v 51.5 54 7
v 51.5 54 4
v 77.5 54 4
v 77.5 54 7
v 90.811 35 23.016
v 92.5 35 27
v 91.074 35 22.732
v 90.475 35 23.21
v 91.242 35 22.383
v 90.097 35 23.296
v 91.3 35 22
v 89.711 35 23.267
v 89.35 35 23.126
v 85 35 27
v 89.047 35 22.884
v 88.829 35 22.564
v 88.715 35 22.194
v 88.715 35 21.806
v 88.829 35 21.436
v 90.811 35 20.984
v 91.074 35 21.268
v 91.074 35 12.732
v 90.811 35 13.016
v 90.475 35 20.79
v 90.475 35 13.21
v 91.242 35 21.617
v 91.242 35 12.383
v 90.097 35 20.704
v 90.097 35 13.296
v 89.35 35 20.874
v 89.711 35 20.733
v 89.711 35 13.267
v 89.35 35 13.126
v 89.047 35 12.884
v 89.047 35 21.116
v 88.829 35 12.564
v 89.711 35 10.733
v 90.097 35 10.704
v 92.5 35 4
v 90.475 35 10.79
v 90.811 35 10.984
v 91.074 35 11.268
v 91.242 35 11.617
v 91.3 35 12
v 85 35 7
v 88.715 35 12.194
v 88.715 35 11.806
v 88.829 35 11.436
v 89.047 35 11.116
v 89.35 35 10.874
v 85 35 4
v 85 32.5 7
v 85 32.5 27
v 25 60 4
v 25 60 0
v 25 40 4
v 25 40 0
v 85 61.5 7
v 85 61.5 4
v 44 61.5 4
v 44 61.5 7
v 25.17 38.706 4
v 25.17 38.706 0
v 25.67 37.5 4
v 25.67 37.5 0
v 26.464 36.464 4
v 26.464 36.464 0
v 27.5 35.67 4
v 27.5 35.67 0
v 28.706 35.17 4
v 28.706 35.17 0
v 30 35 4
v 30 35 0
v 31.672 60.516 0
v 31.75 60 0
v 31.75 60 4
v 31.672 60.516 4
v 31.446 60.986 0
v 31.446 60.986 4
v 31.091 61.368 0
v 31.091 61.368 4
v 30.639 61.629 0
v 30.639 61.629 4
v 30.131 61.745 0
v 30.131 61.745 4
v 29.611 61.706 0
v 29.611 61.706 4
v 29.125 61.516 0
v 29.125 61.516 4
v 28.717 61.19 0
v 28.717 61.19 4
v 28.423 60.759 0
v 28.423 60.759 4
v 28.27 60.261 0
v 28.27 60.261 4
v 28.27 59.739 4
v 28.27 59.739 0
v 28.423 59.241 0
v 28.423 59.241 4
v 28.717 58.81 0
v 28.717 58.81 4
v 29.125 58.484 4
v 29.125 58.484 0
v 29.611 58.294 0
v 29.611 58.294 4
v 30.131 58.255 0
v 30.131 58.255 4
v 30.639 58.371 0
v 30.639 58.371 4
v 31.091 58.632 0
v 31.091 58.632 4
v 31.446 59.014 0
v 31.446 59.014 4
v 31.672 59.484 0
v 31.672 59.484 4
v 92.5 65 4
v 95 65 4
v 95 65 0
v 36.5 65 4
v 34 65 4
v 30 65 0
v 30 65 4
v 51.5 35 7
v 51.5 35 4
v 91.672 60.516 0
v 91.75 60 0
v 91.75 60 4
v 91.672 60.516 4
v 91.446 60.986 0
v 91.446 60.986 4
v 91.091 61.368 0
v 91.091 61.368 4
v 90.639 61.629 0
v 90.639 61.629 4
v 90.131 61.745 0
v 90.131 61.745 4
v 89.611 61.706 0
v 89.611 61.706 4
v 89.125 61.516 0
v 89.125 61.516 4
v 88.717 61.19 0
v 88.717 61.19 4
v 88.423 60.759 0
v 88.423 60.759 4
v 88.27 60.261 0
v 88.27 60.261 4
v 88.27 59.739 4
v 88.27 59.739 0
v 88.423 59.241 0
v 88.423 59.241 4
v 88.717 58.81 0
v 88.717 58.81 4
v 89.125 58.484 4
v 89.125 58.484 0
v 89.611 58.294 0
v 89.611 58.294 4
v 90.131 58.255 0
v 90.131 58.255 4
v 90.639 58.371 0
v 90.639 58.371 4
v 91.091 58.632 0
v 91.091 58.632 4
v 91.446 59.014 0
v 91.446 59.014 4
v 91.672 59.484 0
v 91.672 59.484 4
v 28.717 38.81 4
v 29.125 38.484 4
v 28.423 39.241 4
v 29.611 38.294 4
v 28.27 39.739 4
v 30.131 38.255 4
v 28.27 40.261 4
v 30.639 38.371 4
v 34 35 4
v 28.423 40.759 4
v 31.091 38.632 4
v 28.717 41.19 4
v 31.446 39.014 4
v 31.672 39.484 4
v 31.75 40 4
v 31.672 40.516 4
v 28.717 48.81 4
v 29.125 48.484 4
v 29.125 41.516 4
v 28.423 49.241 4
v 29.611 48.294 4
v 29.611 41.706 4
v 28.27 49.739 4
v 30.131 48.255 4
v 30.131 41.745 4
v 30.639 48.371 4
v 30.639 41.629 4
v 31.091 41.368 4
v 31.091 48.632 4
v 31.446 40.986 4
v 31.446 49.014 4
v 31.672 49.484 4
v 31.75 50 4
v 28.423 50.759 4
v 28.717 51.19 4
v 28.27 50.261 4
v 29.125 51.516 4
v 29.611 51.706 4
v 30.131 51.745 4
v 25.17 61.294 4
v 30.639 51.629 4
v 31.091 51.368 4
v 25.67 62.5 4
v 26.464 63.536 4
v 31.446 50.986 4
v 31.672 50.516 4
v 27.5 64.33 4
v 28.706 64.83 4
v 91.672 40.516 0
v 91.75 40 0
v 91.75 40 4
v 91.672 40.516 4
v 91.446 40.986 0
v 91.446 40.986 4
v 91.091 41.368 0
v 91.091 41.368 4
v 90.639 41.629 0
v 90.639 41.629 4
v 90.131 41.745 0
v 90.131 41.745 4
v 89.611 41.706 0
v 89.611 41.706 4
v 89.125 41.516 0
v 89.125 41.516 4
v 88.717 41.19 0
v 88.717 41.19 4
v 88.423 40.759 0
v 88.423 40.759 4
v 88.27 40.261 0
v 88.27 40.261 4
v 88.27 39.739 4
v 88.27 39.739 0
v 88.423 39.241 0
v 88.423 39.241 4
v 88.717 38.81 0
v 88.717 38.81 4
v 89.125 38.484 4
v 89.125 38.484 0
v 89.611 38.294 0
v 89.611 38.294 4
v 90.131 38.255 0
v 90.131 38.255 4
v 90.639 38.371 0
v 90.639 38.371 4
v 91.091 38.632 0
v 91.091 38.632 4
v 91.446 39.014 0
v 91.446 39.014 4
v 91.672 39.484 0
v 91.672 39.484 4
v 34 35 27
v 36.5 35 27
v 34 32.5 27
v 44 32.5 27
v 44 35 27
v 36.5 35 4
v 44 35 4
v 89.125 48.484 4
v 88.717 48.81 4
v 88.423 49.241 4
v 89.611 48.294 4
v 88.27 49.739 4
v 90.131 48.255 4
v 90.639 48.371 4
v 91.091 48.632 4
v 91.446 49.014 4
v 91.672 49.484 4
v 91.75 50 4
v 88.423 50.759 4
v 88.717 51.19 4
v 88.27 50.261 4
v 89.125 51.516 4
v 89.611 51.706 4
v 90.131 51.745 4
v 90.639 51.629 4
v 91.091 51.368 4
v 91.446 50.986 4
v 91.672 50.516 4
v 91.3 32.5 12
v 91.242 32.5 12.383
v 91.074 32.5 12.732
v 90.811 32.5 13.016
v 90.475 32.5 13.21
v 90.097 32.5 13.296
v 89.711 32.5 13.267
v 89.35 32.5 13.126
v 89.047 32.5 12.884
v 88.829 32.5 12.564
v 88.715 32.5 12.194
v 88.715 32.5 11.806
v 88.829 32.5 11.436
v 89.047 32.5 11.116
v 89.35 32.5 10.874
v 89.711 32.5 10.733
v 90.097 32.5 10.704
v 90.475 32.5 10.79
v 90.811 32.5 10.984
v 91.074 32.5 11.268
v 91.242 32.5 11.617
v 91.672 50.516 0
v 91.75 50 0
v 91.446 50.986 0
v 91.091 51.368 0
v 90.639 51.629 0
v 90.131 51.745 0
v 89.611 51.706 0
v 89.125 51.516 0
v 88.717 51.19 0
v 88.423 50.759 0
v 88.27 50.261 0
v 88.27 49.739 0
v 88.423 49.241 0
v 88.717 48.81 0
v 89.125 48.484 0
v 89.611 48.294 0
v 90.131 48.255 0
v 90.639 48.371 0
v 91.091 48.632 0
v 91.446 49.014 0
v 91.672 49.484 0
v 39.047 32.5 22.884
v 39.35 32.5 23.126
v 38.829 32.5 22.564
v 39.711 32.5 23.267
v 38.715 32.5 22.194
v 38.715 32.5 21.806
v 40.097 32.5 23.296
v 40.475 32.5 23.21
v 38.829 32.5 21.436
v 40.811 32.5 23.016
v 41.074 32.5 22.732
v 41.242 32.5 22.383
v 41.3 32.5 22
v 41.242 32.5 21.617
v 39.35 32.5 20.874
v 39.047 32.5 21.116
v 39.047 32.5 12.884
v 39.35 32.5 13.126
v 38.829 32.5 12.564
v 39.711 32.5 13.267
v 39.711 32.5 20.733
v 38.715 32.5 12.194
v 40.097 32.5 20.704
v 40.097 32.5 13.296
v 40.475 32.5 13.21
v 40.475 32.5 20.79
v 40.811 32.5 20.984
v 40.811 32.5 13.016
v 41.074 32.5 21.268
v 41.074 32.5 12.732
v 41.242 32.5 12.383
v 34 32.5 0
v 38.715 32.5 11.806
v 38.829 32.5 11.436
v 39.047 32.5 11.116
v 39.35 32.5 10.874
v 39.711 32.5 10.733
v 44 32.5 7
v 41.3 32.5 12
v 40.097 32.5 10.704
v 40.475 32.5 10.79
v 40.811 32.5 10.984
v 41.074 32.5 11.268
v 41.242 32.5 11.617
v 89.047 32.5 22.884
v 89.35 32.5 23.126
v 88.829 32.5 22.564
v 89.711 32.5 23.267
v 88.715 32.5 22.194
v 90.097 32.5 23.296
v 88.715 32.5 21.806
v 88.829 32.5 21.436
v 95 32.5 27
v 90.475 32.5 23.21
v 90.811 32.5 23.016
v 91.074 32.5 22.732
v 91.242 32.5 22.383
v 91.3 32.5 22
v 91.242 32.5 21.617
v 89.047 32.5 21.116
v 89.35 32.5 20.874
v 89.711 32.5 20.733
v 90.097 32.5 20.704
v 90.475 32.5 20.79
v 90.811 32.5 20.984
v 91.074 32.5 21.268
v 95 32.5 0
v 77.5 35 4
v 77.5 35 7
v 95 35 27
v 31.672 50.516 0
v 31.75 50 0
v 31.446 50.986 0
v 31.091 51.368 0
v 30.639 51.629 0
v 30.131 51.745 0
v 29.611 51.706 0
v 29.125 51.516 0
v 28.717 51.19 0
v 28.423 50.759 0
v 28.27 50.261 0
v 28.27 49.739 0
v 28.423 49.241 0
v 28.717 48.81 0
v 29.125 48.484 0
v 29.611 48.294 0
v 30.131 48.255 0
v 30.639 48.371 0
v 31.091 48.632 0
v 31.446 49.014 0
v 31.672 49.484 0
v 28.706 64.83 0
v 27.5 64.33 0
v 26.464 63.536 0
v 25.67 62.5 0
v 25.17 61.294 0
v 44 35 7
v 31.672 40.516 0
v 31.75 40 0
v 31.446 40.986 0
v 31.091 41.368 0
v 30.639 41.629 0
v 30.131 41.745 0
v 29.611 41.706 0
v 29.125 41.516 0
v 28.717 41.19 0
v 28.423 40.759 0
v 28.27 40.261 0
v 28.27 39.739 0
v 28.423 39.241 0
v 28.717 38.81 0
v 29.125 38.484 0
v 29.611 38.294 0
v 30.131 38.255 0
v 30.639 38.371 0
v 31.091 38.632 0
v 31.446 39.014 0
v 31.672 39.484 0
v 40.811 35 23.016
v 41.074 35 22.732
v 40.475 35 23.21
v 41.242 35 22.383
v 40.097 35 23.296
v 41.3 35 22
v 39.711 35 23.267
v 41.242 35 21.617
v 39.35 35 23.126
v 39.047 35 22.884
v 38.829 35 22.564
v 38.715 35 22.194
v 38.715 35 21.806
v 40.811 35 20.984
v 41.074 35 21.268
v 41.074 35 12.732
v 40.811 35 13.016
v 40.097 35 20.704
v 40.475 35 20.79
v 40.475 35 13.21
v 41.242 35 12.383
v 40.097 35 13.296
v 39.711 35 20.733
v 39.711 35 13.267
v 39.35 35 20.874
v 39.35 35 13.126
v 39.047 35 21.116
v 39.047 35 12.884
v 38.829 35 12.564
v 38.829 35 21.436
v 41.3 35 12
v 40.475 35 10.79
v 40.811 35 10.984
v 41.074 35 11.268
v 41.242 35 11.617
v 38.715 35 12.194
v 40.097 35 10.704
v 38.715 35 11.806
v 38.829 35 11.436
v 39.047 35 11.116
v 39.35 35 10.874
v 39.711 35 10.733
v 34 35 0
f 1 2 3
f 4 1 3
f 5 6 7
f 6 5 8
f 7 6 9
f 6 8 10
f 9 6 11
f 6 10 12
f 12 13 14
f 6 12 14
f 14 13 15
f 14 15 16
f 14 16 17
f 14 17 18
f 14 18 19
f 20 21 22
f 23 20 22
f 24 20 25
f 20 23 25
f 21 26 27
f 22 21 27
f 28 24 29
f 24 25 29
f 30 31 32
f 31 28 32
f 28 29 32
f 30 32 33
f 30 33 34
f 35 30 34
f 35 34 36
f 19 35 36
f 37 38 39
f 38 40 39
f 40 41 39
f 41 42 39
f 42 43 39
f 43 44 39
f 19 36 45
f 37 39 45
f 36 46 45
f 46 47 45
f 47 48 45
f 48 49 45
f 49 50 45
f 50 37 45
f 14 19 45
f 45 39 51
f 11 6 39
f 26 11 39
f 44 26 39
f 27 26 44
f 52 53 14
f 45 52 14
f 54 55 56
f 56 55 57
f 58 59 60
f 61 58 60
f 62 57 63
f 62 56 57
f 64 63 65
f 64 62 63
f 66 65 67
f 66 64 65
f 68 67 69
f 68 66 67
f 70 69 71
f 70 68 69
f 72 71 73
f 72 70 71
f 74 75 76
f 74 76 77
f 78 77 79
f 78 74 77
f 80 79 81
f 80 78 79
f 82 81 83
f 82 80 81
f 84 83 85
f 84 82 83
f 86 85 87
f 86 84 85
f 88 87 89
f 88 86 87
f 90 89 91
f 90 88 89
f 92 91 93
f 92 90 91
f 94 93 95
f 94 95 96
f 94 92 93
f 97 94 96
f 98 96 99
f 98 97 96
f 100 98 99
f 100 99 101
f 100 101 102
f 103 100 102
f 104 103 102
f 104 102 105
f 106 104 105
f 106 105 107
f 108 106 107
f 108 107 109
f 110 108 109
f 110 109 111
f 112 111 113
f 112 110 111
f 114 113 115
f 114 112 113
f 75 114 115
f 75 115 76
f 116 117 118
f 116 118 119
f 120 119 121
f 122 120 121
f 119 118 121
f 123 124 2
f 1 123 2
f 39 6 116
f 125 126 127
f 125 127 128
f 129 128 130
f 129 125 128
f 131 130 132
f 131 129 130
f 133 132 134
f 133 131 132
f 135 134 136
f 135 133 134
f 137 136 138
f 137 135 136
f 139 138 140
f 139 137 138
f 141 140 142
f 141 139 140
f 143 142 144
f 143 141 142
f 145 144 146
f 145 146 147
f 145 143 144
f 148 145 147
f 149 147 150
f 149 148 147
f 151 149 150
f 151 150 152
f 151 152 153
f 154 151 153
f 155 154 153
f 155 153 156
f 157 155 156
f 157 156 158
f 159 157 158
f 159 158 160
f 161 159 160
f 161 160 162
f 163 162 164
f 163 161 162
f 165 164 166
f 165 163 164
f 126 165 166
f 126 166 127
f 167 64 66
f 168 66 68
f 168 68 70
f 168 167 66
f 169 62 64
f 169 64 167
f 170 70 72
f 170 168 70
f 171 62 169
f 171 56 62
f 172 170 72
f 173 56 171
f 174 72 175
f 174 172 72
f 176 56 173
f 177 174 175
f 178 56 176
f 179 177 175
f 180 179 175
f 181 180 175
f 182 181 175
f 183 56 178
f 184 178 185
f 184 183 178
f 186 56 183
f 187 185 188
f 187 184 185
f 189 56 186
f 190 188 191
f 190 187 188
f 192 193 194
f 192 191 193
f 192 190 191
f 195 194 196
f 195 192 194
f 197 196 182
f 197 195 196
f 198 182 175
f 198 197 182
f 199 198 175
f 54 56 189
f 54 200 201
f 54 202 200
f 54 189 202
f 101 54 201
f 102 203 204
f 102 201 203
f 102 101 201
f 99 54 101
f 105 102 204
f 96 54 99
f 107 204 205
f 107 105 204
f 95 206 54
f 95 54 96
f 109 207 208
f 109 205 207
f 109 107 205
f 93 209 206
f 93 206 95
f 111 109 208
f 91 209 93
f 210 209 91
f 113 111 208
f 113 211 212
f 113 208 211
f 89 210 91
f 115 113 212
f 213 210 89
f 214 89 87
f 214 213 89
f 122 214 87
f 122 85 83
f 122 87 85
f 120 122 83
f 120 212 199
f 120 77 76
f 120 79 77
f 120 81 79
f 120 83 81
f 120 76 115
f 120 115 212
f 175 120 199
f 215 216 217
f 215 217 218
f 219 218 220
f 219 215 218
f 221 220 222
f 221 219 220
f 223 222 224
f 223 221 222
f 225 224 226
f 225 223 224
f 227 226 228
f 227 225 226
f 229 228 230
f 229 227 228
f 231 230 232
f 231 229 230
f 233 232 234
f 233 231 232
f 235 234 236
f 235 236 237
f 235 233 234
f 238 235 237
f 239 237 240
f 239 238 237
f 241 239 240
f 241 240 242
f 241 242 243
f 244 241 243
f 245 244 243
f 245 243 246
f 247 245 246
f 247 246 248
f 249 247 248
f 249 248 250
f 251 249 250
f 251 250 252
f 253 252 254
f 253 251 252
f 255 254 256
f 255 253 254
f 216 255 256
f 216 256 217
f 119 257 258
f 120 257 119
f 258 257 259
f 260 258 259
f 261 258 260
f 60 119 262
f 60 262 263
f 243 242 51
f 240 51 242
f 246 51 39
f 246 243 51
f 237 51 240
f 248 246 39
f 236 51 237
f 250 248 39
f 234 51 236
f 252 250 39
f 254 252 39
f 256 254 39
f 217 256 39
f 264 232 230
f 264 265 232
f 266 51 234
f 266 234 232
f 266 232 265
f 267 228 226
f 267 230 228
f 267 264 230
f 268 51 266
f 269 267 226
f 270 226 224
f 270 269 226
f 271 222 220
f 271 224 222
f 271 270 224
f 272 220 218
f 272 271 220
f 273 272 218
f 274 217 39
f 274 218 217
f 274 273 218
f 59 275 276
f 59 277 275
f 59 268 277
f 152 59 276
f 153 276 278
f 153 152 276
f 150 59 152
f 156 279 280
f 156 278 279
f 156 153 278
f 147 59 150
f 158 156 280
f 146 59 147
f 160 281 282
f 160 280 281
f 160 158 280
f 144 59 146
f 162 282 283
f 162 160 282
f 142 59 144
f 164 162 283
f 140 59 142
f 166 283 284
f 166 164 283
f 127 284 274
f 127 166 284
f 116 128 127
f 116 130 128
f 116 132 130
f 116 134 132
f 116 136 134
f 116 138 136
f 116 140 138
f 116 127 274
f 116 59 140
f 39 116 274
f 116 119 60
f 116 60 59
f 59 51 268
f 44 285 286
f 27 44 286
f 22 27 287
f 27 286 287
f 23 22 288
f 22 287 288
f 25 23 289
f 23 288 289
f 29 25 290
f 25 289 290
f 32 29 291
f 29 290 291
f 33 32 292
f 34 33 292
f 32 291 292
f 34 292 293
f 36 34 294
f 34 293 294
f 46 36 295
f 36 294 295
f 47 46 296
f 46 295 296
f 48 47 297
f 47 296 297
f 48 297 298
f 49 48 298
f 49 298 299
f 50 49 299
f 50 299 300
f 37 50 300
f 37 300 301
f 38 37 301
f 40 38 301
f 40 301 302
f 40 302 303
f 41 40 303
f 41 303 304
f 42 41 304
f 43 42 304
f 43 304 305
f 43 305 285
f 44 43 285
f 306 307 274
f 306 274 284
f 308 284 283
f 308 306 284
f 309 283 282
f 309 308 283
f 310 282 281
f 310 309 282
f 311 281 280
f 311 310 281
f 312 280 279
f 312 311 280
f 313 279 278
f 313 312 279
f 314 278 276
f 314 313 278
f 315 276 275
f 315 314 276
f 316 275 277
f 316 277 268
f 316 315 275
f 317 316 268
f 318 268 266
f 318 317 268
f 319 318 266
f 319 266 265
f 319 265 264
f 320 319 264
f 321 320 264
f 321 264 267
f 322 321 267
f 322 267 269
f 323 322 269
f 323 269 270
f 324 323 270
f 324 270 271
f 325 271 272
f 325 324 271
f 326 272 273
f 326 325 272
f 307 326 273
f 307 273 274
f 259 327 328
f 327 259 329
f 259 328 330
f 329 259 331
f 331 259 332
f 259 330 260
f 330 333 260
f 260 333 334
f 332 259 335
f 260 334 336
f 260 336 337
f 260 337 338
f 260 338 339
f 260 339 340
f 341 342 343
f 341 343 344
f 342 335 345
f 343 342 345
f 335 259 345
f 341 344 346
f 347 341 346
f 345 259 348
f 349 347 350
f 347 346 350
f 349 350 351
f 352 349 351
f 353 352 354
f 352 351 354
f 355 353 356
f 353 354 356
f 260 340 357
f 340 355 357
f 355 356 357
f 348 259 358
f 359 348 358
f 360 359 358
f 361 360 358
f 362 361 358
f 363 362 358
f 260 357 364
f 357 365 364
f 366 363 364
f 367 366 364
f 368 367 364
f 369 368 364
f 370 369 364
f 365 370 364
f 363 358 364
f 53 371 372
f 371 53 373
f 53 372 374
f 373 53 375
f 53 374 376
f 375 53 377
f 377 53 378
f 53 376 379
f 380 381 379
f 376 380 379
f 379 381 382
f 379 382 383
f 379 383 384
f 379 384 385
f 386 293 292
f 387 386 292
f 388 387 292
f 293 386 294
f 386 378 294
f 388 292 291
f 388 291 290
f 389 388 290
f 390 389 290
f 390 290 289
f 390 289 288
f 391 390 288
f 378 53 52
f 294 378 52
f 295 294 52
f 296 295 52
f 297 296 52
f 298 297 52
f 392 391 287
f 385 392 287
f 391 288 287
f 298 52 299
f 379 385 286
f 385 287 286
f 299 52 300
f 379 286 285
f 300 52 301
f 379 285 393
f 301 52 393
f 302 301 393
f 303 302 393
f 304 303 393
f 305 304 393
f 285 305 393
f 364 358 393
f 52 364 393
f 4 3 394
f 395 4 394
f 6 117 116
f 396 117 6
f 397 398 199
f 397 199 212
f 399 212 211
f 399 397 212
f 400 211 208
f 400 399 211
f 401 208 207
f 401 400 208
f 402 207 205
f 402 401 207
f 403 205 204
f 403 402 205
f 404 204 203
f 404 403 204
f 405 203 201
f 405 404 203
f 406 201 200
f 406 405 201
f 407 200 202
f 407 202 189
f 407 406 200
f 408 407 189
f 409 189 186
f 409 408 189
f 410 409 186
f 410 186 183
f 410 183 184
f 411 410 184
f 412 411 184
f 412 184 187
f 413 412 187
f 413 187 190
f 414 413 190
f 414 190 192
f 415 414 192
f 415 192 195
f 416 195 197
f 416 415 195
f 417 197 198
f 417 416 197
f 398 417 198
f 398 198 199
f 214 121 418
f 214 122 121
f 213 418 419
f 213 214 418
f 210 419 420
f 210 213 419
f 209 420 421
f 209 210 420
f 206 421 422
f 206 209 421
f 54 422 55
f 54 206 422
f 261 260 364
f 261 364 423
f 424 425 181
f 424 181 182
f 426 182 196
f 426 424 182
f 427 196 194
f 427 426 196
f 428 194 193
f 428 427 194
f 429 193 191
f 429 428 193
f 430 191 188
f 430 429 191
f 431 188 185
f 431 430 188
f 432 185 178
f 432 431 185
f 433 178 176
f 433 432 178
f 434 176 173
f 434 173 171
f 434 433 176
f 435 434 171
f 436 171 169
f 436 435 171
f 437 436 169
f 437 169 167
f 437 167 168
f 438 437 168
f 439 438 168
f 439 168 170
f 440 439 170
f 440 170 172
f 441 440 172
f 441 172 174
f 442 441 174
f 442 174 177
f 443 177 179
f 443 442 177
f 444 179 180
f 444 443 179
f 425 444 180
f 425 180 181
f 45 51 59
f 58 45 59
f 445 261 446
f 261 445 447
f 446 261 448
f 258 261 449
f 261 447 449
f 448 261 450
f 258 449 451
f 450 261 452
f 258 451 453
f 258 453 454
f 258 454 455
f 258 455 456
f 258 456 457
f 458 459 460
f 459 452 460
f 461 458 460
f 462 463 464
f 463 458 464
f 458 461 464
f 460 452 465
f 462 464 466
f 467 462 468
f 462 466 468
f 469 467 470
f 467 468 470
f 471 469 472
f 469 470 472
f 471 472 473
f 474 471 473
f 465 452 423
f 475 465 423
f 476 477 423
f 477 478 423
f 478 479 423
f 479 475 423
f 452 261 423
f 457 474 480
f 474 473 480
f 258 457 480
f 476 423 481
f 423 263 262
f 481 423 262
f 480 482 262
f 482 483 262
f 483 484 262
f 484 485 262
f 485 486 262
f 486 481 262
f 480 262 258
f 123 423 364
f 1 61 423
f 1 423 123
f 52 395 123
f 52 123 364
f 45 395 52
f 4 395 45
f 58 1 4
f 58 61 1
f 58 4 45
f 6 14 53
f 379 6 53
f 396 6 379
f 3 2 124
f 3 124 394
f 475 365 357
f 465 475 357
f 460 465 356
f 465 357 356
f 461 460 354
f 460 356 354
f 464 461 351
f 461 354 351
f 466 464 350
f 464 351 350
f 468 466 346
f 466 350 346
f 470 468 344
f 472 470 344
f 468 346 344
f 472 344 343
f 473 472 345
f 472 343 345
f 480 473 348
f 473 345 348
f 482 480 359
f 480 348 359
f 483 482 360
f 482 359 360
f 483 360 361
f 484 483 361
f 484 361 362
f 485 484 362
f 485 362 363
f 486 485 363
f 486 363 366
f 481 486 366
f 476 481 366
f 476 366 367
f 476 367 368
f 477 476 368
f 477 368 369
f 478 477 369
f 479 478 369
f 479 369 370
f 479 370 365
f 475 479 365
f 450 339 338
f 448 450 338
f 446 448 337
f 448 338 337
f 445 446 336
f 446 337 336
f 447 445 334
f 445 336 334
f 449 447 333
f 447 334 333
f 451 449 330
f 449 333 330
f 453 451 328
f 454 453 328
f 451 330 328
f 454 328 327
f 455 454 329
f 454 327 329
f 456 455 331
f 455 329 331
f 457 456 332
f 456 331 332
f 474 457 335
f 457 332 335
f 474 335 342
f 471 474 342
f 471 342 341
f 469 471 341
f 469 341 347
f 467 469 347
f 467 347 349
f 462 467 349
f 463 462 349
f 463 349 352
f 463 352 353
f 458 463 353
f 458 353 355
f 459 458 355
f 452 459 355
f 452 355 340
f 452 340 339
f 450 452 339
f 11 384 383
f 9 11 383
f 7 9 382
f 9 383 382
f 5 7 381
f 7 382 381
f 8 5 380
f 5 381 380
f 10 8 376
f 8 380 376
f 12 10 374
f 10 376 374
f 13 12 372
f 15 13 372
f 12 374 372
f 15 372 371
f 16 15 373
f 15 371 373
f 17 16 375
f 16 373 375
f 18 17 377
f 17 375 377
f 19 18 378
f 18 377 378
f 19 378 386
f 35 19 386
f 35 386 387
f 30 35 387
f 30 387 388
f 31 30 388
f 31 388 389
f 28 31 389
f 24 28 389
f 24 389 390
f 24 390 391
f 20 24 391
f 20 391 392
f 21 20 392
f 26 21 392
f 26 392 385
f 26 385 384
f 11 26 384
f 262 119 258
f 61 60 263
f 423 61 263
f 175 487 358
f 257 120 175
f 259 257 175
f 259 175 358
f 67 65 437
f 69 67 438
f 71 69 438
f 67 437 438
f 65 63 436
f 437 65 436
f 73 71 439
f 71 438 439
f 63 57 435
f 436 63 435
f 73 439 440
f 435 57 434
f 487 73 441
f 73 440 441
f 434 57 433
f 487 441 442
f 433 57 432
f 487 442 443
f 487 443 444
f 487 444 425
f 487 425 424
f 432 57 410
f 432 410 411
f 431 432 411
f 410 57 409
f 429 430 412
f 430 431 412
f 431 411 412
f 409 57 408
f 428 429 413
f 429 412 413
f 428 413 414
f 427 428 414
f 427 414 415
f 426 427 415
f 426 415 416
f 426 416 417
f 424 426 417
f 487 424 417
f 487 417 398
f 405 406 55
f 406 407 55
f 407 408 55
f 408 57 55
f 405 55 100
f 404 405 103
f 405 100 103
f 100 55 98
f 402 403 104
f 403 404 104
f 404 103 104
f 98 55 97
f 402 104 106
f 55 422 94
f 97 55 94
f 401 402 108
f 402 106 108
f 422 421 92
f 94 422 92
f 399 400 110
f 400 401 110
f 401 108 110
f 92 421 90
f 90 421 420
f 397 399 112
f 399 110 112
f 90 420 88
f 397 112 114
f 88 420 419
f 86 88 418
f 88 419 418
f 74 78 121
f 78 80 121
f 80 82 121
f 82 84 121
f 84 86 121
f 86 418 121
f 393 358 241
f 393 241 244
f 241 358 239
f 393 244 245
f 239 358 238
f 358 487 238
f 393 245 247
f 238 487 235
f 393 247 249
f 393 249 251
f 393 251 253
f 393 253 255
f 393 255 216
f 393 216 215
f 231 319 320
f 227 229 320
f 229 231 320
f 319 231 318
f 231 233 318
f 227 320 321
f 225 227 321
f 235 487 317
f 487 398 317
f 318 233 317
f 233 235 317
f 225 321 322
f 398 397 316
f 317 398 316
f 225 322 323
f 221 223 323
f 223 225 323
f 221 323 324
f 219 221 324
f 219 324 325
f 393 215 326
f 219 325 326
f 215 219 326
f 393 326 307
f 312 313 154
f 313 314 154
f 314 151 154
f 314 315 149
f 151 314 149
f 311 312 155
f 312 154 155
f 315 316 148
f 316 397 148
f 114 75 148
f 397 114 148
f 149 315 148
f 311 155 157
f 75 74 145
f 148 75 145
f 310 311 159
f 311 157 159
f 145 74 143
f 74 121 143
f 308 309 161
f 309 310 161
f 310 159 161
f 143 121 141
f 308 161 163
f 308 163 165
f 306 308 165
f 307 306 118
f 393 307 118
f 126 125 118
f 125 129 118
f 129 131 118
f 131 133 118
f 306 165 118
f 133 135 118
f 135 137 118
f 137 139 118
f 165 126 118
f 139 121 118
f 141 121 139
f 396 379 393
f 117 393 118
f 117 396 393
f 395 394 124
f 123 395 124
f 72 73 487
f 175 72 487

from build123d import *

# Parameters (mm, degrees)
F1_R      = 1.75
F1_W      = 26
F1_H      = 19
F1_W_2    = 2.5
F1_H_2    = 2.5
F1_W_3    = 7.5
F2_DEPTH  = 4
F3_DEPTH  = 7
F4_DEPTH  = 27
F6_DEPTH  = 2.5
F8_DEPTH  = 2.5
F9_R      = 5
F10_R     = 1.3
F11_DEPTH = 25


with BuildPart() as f2:
    # F1 (on Top) → F2 (new body)
    with BuildSketch(Plane.XY):
        Polygon((34, 35), (36.5, 35), (44, 35), (44, 61.5), (85, 61.5), (85, 35), (92.5, 35), (95, 35), (95, 65), (36.5, 65), (25, 65), (25, 35), align=None)
        with Locations((30, 40)):
            Circle(F1_R, mode=Mode.SUBTRACT)
        with Locations((90, 40)):
            Circle(F1_R, mode=Mode.SUBTRACT)
        with Locations((30, 50)):
            Circle(F1_R, mode=Mode.SUBTRACT)
        with Locations((30, 60)):
            Circle(F1_R, mode=Mode.SUBTRACT)
        with Locations((90, 50)):
            Circle(F1_R, mode=Mode.SUBTRACT)
        with Locations((90, 60)):
            Circle(F1_R, mode=Mode.SUBTRACT)
        Polygon((44, 61.5), (44, 35), (51.5, 35), (51.5, 54), (77.5, 54), (77.5, 35), (85, 35), (85, 61.5), align=None)
        with Locations((64.5, 44.5)):
            Rectangle(F1_W, F1_H)
        with Locations((35.25, 33.75)):
            Rectangle(F1_W_2, F1_H_2)
        with Locations((40.25, 33.75)):
            Rectangle(F1_W_3, F1_H_2)
        Polygon((51.5, 35), (44, 35), (44, 32.5), (85, 32.5), (85, 35), (77.5, 35), align=None)
        with Locations((88.75, 33.75)):
            Rectangle(F1_W_3, F1_H_2)
        with Locations((93.75, 33.75)):
            Rectangle(F1_W_2, F1_H_2)
    extrude(amount=F2_DEPTH)

    # F1 (on Top) → F3 (join)
    with BuildSketch(Plane.XY):
        Polygon((44, 61.5), (44, 35), (51.5, 35), (51.5, 54), (77.5, 54), (77.5, 35), (85, 35), (85, 61.5), align=None)
        Polygon((51.5, 35), (44, 35), (44, 32.5), (85, 32.5), (85, 35), (77.5, 35), align=None)
    extrude(amount=F3_DEPTH)

    # F1 (on Top) → F4 (join)
    with BuildSketch(Plane.XY):
        with Locations((40.25, 33.75)):
            Rectangle(F1_W_3, F1_H_2)
        with Locations((88.75, 33.75)):
            Rectangle(F1_W_3, F1_H_2)
        with Locations((93.75, 33.75)):
            Rectangle(F1_W_2, F1_H_2)
        with Locations((35.25, 33.75)):
            Rectangle(F1_W_2, F1_H_2)
    extrude(amount=F4_DEPTH)

    # F5 (on face) → F6 (join)
    with BuildSketch(Plane.YZ.offset(95)):
        Polygon((65, 4), (35, 27), (35, 4), align=None)
    extrude(amount=-F6_DEPTH)

    # F7 (on face) → F8 (join)
    with BuildSketch(Plane(origin=(34, 0, 0), x_dir=(0, -1, 0), z_dir=(-1, 0, 0))):
        Polygon((-65, 4), (-35, 4), (-35, 27), align=None)
    extrude(amount=-F8_DEPTH)

    # F9
    f9_edges = [f2.edges().sort_by_distance(p)[0] for p in [
        (25, 35, 2),
        (25, 65, 2),
    ]]
    fillet(f9_edges, radius=F9_R)

    # F10 (on face) → F11 (cut)
    with BuildSketch(Plane.XZ.offset(-32.5)):
        with Locations((40, 22)):
            Circle(F10_R)
        with Locations((40, 12)):
            Circle(F10_R)
        with Locations((90, 12)):
            Circle(F10_R)
        with Locations((90, 22)):
            Circle(F10_R)
    extrude(amount=-F11_DEPTH, mode=Mode.SUBTRACT)


solid = f2.part
